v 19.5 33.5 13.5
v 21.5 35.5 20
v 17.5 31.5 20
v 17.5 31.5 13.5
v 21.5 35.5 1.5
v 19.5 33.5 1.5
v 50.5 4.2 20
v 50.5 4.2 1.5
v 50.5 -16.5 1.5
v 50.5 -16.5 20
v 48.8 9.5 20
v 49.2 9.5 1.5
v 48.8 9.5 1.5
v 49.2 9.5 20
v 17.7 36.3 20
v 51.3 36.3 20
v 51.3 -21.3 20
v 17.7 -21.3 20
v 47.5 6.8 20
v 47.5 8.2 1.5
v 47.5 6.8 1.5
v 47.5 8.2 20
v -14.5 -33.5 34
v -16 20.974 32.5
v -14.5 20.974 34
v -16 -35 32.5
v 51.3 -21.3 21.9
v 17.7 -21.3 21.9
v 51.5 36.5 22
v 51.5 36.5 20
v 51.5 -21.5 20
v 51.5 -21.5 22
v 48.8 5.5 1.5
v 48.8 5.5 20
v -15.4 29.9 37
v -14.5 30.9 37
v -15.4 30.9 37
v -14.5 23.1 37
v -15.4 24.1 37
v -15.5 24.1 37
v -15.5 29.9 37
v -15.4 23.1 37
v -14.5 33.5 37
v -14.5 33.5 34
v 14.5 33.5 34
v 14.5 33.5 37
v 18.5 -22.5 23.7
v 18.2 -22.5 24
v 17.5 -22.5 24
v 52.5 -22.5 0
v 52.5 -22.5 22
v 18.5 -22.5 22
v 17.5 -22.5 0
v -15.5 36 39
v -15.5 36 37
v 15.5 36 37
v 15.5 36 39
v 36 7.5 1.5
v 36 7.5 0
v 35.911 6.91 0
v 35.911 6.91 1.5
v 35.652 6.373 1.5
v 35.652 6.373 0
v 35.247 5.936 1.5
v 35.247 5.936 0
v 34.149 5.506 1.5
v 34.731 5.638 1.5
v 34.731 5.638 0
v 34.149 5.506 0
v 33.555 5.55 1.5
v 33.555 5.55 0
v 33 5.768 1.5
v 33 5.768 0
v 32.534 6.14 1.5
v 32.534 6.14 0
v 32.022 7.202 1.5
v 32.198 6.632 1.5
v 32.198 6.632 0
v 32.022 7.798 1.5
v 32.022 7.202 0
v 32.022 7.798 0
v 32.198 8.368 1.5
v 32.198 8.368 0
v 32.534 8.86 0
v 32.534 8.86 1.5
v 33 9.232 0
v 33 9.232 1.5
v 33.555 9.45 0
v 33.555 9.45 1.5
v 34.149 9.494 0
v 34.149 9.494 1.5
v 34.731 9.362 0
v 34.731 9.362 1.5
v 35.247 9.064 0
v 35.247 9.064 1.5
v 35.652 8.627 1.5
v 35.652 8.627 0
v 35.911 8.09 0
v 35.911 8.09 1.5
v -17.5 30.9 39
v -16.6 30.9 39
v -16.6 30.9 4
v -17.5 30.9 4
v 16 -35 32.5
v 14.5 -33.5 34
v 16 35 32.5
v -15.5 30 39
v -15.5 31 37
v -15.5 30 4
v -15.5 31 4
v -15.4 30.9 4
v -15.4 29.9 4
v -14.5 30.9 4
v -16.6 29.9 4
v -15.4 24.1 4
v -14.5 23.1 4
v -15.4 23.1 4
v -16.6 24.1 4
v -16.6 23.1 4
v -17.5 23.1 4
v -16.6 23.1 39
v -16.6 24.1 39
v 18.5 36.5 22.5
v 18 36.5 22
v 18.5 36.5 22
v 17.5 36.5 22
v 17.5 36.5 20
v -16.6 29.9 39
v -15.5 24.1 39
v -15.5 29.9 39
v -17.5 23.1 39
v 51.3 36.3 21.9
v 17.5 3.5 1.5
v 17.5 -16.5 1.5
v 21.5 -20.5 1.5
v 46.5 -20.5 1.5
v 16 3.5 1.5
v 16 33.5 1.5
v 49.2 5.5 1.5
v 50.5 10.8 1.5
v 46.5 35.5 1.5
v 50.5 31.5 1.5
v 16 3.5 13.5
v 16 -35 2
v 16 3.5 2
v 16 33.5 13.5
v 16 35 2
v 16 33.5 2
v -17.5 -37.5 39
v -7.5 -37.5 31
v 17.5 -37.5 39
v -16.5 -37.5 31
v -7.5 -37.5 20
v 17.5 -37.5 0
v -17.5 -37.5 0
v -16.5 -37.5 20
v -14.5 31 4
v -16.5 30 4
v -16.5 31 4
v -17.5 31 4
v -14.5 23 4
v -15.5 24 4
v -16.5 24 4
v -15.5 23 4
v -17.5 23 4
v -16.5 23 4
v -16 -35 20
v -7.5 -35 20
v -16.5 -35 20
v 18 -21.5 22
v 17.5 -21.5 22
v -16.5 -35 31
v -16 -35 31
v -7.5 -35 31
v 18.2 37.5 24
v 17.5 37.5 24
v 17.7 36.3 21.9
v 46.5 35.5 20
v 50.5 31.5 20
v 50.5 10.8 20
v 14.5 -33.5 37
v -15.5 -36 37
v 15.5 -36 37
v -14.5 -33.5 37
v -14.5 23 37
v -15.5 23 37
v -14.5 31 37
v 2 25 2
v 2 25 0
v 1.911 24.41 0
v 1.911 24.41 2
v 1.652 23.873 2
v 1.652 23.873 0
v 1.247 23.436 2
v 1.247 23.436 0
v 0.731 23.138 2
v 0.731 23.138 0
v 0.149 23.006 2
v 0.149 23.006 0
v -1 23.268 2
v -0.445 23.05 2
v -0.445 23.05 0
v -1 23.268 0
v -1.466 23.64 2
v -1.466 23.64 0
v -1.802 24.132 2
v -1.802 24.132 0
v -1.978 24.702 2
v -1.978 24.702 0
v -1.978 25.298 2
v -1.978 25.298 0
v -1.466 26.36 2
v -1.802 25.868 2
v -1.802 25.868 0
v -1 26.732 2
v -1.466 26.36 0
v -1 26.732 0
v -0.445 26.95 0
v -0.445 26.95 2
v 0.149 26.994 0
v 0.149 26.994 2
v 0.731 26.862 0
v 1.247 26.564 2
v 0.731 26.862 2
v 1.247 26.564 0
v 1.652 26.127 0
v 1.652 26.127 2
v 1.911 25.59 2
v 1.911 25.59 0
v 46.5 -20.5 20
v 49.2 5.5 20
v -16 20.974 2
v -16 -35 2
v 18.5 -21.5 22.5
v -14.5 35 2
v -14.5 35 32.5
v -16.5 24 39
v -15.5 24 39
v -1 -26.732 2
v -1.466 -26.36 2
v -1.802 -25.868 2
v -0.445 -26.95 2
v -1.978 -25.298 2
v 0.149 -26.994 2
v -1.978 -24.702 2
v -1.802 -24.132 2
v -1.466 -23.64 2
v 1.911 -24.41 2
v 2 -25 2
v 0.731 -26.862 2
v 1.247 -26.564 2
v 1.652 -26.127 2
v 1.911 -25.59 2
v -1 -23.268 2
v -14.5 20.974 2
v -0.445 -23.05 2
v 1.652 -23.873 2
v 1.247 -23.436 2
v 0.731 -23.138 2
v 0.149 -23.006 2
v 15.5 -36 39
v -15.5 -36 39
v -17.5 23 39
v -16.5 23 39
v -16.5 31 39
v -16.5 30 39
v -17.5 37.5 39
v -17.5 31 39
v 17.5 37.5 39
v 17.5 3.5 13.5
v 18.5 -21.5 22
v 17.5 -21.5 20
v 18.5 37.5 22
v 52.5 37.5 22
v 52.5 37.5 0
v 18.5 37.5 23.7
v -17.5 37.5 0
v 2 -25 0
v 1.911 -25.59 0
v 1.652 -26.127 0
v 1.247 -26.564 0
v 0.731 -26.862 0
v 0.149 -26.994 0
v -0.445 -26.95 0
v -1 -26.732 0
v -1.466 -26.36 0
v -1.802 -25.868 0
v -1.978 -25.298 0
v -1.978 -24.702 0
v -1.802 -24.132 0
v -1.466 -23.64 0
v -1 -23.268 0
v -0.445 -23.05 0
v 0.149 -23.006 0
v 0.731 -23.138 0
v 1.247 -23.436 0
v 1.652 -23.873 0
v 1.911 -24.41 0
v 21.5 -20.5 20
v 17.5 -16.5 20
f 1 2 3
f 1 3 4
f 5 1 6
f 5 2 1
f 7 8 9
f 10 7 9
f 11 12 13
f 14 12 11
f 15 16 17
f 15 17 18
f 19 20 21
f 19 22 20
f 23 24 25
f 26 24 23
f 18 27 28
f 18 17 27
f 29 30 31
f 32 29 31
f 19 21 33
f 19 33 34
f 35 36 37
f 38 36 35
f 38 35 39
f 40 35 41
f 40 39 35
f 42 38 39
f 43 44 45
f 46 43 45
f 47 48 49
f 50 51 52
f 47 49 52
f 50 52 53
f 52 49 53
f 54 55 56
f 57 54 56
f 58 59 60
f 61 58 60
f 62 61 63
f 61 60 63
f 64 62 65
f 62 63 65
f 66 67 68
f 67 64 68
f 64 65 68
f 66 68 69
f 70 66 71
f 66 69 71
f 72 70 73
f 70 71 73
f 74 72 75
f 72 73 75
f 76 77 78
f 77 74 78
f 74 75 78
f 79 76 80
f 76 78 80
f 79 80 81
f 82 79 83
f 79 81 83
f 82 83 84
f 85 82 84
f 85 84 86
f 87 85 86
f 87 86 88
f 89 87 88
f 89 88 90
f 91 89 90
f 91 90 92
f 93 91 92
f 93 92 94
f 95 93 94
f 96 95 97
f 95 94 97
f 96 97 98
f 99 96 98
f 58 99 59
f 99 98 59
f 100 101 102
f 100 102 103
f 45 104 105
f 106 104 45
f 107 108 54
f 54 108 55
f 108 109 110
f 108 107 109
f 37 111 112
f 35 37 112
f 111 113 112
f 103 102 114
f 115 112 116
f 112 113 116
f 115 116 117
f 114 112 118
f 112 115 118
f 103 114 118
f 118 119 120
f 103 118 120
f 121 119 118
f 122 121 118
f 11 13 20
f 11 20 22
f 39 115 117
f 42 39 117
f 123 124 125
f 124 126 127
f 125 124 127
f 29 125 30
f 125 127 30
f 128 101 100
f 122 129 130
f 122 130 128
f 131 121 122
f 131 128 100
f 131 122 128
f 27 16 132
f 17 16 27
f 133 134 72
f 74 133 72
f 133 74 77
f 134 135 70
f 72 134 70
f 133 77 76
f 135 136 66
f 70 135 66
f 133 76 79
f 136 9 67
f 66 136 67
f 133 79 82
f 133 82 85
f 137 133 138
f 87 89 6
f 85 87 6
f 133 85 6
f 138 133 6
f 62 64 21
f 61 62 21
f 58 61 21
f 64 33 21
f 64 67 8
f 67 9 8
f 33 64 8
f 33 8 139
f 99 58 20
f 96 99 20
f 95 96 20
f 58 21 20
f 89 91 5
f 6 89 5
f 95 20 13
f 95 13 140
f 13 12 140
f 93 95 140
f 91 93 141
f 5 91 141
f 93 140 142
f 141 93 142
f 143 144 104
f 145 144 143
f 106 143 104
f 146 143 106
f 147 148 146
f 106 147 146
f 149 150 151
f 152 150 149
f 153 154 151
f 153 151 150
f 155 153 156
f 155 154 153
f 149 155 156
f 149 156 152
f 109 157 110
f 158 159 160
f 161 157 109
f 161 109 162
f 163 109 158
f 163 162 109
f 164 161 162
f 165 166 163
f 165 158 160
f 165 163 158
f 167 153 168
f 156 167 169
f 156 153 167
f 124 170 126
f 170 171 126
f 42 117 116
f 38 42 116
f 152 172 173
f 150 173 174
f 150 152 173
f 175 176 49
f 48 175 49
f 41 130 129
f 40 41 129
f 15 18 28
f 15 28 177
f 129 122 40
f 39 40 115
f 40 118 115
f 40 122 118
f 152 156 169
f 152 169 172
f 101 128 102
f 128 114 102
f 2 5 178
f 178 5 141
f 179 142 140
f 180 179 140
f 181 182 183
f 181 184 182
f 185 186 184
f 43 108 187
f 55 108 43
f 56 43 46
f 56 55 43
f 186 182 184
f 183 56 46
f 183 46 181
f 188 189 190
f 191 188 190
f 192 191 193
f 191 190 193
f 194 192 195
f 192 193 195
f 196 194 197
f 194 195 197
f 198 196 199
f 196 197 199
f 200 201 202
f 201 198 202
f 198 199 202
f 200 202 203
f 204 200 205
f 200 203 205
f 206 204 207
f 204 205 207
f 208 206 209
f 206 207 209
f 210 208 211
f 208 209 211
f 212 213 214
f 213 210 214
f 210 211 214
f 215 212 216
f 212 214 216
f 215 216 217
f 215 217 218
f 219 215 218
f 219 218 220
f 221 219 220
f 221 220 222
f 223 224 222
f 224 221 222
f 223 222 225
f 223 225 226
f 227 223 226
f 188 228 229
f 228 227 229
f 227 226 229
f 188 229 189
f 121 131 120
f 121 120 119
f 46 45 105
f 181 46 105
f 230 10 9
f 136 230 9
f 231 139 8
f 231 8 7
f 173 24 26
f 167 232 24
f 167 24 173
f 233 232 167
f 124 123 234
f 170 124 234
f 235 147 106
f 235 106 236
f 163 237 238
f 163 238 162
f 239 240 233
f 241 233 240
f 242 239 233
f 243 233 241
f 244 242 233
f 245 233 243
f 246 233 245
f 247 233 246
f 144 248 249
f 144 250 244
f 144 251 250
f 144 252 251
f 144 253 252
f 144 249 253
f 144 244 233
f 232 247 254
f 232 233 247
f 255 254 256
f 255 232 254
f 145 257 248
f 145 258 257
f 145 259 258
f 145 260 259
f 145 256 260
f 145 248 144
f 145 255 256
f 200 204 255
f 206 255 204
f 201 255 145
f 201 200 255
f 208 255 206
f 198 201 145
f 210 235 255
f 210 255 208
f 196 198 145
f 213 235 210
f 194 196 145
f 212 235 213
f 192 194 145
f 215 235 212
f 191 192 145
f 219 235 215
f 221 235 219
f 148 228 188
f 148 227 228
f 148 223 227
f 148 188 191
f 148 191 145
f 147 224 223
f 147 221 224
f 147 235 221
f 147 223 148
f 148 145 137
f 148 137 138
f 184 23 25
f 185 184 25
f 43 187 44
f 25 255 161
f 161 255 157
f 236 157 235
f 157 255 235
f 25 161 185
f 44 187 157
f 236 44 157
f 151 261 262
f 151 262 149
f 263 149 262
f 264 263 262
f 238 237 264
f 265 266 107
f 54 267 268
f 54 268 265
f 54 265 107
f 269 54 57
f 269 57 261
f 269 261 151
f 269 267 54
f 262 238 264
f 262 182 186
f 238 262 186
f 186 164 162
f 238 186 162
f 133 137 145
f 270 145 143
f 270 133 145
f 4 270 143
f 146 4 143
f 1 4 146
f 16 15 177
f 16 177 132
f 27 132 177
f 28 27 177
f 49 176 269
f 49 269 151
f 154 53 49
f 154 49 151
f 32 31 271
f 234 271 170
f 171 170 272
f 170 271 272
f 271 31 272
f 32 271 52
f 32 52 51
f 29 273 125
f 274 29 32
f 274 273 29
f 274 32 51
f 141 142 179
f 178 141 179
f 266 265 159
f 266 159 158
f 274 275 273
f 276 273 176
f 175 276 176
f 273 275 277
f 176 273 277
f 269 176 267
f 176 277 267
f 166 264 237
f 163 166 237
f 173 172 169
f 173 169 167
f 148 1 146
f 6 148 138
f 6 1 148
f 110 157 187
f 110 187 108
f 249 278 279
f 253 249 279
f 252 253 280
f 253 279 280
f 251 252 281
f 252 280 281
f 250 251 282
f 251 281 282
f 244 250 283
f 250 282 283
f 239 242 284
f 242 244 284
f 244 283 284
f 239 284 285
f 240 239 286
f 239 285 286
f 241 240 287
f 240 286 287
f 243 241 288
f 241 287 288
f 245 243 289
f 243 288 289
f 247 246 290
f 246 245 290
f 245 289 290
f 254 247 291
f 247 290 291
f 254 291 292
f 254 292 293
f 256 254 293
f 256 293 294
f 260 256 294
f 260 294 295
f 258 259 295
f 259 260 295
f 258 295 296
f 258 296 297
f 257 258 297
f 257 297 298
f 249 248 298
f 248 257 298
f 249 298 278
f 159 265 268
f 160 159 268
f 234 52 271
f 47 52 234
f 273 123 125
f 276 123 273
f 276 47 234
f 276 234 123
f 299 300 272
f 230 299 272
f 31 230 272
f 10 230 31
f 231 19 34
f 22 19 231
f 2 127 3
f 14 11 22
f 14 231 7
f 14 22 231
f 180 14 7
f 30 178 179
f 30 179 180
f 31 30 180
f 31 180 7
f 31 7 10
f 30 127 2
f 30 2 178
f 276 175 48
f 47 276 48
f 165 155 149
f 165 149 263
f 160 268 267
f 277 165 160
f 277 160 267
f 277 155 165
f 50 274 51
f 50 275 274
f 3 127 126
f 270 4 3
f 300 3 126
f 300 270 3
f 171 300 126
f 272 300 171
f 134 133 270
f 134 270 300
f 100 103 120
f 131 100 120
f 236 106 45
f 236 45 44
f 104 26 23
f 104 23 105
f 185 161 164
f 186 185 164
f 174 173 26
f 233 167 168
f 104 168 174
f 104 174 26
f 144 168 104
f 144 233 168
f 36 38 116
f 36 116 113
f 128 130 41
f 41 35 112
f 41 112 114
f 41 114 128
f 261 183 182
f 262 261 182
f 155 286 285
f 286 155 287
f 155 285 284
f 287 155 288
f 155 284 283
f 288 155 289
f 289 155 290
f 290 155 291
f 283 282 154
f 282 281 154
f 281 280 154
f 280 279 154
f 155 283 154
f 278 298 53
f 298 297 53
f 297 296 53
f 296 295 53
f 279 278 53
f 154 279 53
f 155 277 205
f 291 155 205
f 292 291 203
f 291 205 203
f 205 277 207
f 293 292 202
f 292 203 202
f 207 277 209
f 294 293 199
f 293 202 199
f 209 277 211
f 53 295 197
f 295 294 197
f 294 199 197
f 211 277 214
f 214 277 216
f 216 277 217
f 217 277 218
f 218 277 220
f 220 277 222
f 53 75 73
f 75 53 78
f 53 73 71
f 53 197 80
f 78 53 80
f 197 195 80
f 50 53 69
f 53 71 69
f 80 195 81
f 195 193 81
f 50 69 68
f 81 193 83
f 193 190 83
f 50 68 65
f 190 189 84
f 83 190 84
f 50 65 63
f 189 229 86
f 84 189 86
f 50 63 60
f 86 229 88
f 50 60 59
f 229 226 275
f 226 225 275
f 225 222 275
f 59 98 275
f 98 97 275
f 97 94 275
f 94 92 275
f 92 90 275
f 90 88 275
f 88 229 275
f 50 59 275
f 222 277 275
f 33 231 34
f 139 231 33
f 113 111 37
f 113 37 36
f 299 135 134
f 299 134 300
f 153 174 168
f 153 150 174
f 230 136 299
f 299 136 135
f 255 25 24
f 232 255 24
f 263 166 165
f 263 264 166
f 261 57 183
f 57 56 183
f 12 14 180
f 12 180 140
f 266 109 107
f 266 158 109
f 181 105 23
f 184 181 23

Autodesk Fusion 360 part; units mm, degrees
sketch "Sketch1" plane through (0, 0, 0) normal (0, 0, 1) x (1, 0, 0)
  line L0 (-17.5, 37.5) -> (17.5, 37.5)
  line L1 (17.5, 37.5) -> (17.5, -37.5)
  line L2 (17.5, -37.5) -> (-17.5, -37.5)
  line L3 (-17.5, -37.5) -> (-17.5, 37.5)
  line L4 (-14.5, 33.5) -> (14.5, 33.5)
  line L5 (14.5, 33.5) -> (14.5, -33.5)
  line L6 (14.5, -33.5) -> (-14.5, -33.5)
  line L7 (-14.5, -33.5) -> (-14.5, 33.5)
  line L8 (-15.5, 36) -> (15.5, 36)
  line L9 (15.5, 36) -> (15.5, -36)
  line L10 (15.5, -36) -> (-15.5, -36)
  line L11 (-15.5, -36) -> (-15.5, 36)
  line L12 (-14.5, -33.5) -> (14.5, 33.5) construction
  line L13 (-15.5, -36) -> (15.5, 36) construction
  line L14 (-17.5, -37.5) -> (17.5, 37.5) construction
  circle A0 centre (0, 25) radius 2
  circle A1 centre (0, -25) radius 2
  line L15 (0, 25) -> (0, 0) construction
  line L16 (0, -25) -> (0, 0) construction
  dimension "d1" = 35
  dimension "d2" = 75
  dimension "d3" = 29
  dimension "d4" = 67
  dimension "d5" = 31
  dimension "d6" = 72
  dimension "d7" = 4
  dimension "d8" = 4
  dimension "d9" = 25
extrude "Extrude1" add sketch "Sketch1" along normal blind 2 contours L4 L5 L6 L7 makes body 1
extrude "Extrude2" add sketch "Sketch1" along normal blind 37 contours L8 L9 L10 L11 bodies 1
extrude "Extrude3" add sketch "Sketch1" along normal blind 39 contours L0 L1 L2 L3 bodies 1
sketch "Sketch2" plane through (-17.5, 0, 0) normal (-1, 0, 0) x (0, -1, 0)
  line L0 (-37.5, 0) -> (37.5, 0)
  line L1 (37.5, 0) -> (37.5, 39)
  line L2 (37.5, 39) -> (-37.5, 39)
  line L3 (-37.5, 39) -> (-37.5, 0)
  line L4 (-30, 39) -> (-24, 39)
  line L5 (-24, 39) -> (-24, 4)
  line L6 (-24, 4) -> (-30, 4)
  line L7 (-30, 4) -> (-30, 39)
  dimension "d16" = 6
  dimension "d17" = 35
extrude "Extrude4" cut sketch "Sketch2" against normal up to surface (3 mm away) contours L2 L4 L5 L6 L7 bodies 1
sketch "Sketch3" plane through (0, 0, 39) normal (0, 0, 1) x (-1, 0, 0)
  line L0 (17.5, -30) -> (15.5, -30)
  line L1 (15.5, -30) -> (15.5, -36)
  line L2 (15.5, -36) -> (-15.5, -36)
  line L3 (-15.5, -36) -> (-15.5, 36)
  line L4 (-15.5, 36) -> (15.5, 36)
  line L5 (15.5, 36) -> (15.5, -24)
  line L6 (15.5, -24) -> (17.5, -24)
  line L7 (17.5, -24) -> (17.5, 37.5)
  line L8 (17.5, 37.5) -> (-17.5, 37.5)
  line L9 (-17.5, 37.5) -> (-17.5, -37.5)
  line L10 (-17.5, -37.5) -> (17.5, -37.5)
  line L11 (17.5, -37.5) -> (17.5, -30)
  line L12 (15.5, -30) -> (14.5, -30)
  line L13 (14.5, -30) -> (14.5, -33.5)
  line L14 (14.5, -33.5) -> (-14.5, -33.5)
  line L15 (-14.5, -33.5) -> (-14.5, 33.5)
  line L16 (-14.5, 33.5) -> (14.5, 33.5)
  line L17 (14.5, 33.5) -> (14.5, -24)
  line L18 (14.5, -24) -> (15.5, -24)
  line L19 (15.5, -24) -> (15.5, 36)
  line L20 (15.5, 36) -> (-15.5, 36)
  line L21 (-15.5, 36) -> (-15.5, -36)
  line L22 (-15.5, -36) -> (15.5, -36)
  line L23 (15.5, -36) -> (15.5, -30)
  line L24 (17.5, -30) -> (14.5, -30)
  line L25 (14.5, -30) -> (14.5, -31)
  line L26 (14.5, -31) -> (17.5, -31)
  line L27 (17.5, -31) -> (17.5, -30)
  line L28 (17.5, -24) -> (14.5, -24)
  line L29 (14.5, -24) -> (14.5, -23)
  line L30 (14.5, -23) -> (17.5, -23)
  line L31 (17.5, -23) -> (17.5, -24)
  line L32 (16.5, -31) -> (16.5, -30)
  line L33 (16.5, -23) -> (16.5, -24)
  dimension "d20" = 3
  dimension "d21" = 1
  dimension "d22" = 3
  dimension "d23" = 1
extrude "Extrude5" cut sketch "Sketch3" against normal blind 35 contours L0 L11 L24 L26 L27 L32 | L1 L12 L13 L23 L24 L25 L26 | L6 L7 L28 L30 L31 L33 | L5 L17 L18 L19 L28 L29 L30 bodies 1
copy_body "Body->Comp1" bodies 1 removing the originals makes body 2 in component "base"
sketch "Sketch1 (2)" plane through (0, 0, 4) normal (0, 0, 1) x (-1, 0, 0) in component "protection"
  line L0 (14.5, -23) -> (14.5, -31)
  line L1 (14.5, -31) -> (15.5, -31)
  line L2 (15.5, -31) -> (15.5, -30)
  line L3 (15.5, -30) -> (16.5, -30)
  line L4 (16.5, -30) -> (16.5, -31)
  line L5 (16.5, -31) -> (17.5, -31)
  line L6 (17.5, -31) -> (17.5, -23)
  line L7 (17.5, -23) -> (16.5, -23)
  line L8 (16.5, -23) -> (16.5, -24)
  line L9 (16.5, -24) -> (15.5, -24)
  line L10 (15.5, -24) -> (15.5, -23)
  line L11 (15.5, -23) -> (14.5, -23)
  line L12 (16.6, -23.1) -> (16.6, -24.1)
  line L13 (16.6, -24.1) -> (15.4, -24.1)
  line L14 (15.4, -24.1) -> (15.4, -23.1)
  line L15 (15.4, -23.1) -> (14.6, -23.1)
  line L16 (14.6, -23.1) -> (14.6, -30.9)
  line L17 (14.6, -30.9) -> (15.4, -30.9)
  line L18 (15.4, -30.9) -> (15.4, -29.9)
  line L19 (15.4, -29.9) -> (16.6, -29.9)
  line L20 (16.6, -29.9) -> (16.6, -30.9)
  line L21 (16.6, -30.9) -> (17.4, -30.9)
  line L22 (17.4, -30.9) -> (17.4, -23.1)
  line L23 (17.4, -23.1) -> (16.6, -23.1)
  line L24 (14.6, -23.1) -> (14.5, -23.1)
  line L25 (17.4, -23.1) -> (17.5, -23.1)
  line L26 (14.6, -30.9) -> (14.5, -30.9)
  line L27 (17.4, -30.9) -> (17.5, -30.9)
  line L28 (16.5, -24.1) -> (16.5, -29.9)
  dimension "d26" = -0.1
extrude "Extrude1'" add sketch "Sketch1 (2)" along normal blind 35 separate body contours L0 L16 L24 L26 | L13 L14 L15 L16 L17 L18 L19 L28 | L12 L13 L19 L20 L21 L22 L23 L28 | L6 L22 L25 L27 makes body 3 in component "protection"
sketch "Sketch2 (2)" plane through (0, 0, 39) normal (0, 0, 1) x (-1, 0, 0) in component "protection"
  line L0 (14.5, -30.9) -> (15.4, -30.9)
  line L1 (15.4, -30.9) -> (15.4, -29.9)
  line L2 (15.4, -29.9) -> (16.6, -29.9)
  line L3 (16.6, -29.9) -> (16.6, -30.9)
  line L4 (16.6, -30.9) -> (17.4, -30.9)
  line L5 (17.4, -30.9) -> (17.5, -30.9)
  line L6 (17.5, -30.9) -> (17.5, -23.1)
  line L7 (17.5, -23.1) -> (17.4, -23.1)
  line L8 (17.4, -23.1) -> (16.6, -23.1)
  line L9 (16.6, -23.1) -> (16.6, -24.1)
  line L10 (16.6, -24.1) -> (15.4, -24.1)
  line L11 (15.4, -24.1) -> (15.4, -23.1)
  line L12 (15.4, -23.1) -> (14.5, -23.1)
  line L13 (14.5, -23.1) -> (14.5, -30.9)
  line L14 (15.5, -29.9) -> (15.5, -24.1)
extrude "Extrude4'" cut sketch "Sketch2 (2)" against normal blind 2 contours L0 L1 L2 L10 L11 L12 L13 L14 bodies 3 in component "protection"
sketch "Sketch4" plane through (0, 0, 2) normal (0, 0, 1) x (-1, 0, 0)
  circle A0 centre (0, -25) radius 2
  circle A1 centre (0, 25) radius 2
  line L0 (14.5, 33.5) -> (-14.5, 33.5)
  line L1 (-14.5, 33.5) -> (-14.5, -33.5)
  line L2 (-14.5, -33.5) -> (14.5, -33.5)
  line L3 (14.5, -33.5) -> (14.5, 33.5)
  line L4 (17.5, -37.5) -> (17.5, 37.5)
  line L5 (17.5, 37.5) -> (-17.5, 37.5)
  line L6 (-17.5, 37.5) -> (-17.5, -37.5)
  line L7 (-17.5, -37.5) -> (17.5, -37.5)
  line L8 (-14.5, -33.5) -> (-14.5, 33.5)
  line L9 (-14.5, 33.5) -> (14.5, 33.5)
  line L10 (14.5, 33.5) -> (14.5, -33.5)
  line L11 (14.5, -33.5) -> (-14.5, -33.5)
  circle A2 centre (0, 25) radius 2
  circle A3 centre (0, -25) radius 2
  line L12 (-16, -35) -> (16, -35)
  line L13 (16, -35) -> (16, 35)
  line L14 (16, 35) -> (-16, 35)
  line L15 (-16, 35) -> (-16, -35)
  line L16 (16, -35) -> (14.5, -35)
  line L17 (14.5, -35) -> (14.5, -20.9735)
  line L18 (14.5, -20.9735) -> (16, -20.9735)
  line L19 (16, -20.9735) -> (16, -35)
  dimension "d39" = 1.5
extrude "Extrude1''" cut sketch "Sketch4" along normal blind 32 contours L0 L1 L2 L3 L8 L9 L10 L11 L12 L13 L14 L15 L17 L18 bodies 2 in component "base"
chamfer "Chamfer1" distance 1.5 angle 45 4 edges at (-16, -7.0132, 34) (0, -35, 34) (0.75, 35, 34) (16, 0, 34) on bodies 2 in component "base"
sketch "Sketch5" plane through (0, 0, 0) normal (0, 0, 1) x (1, 0, 0)
  line L0 (-17.5, -37.5) -> (-17.5, 37.5)
  line L1 (-17.5, 37.5) -> (17.5, 37.5)
  line L2 (17.5, 37.5) -> (17.5, -37.5)
  line L3 (17.5, -37.5) -> (-17.5, -37.5)
  circle A0 centre (0, -25) radius 2
  circle A1 centre (0, 25) radius 2
  line L4 (17.5, 37.5) -> (52.5, 37.5)
  line L5 (52.5, 37.5) -> (52.5, -22.5)
  line L6 (52.5, -22.5) -> (17.5, -22.5)
  line L7 (17.5, -22.5) -> (17.5, 37.5)
  line L8 (17.5, 35.5) -> (50.5, 35.5)
  line L9 (50.5, 35.5) -> (50.5, -20.5)
  line L10 (50.5, -20.5) -> (17.5, -20.5)
  line L11 (17.5, -20.5) -> (17.5, 35.5)
  line L12 (51.5, -21.5) -> (16.5, -21.5)
  line L13 (16.5, -21.5) -> (16.5, 36.5)
  line L14 (16.5, 36.5) -> (51.5, 36.5)
  line L15 (51.5, 36.5) -> (51.5, -21.5)
  line L16 (17.5, 35.5) -> (50.5, -20.5) construction
  circle A2 centre (34, 7.5) radius 2
  point P0 (34, 7.5)
  dimension "d43" = 35
  dimension "d44" = 60
  dimension "d45" = 2
  dimension "d46" = 2
  dimension "d47" = 2
  dimension "d48" = -1
  dimension "d49" = 4
extrude "Extrude2'" add sketch "Sketch5" along normal blind 1.5 contours L2 L7 L8 L9 L10 L11 bodies 2 in component "base"
sketch "Sketch1 (3)" plane through (17.5, 0, 0) normal (1, 0, 0) x (0, 1, 0) in component "base"
  line L0 (-20.5, 0) -> (-20.5, 1.5)
  line L1 (-20.5, 1.5) -> (35.5, 1.5)
  line L2 (35.5, 1.5) -> (35.5, 0)
  line L3 (35.5, 0) -> (37.5, 0)
  line L4 (37.5, 0) -> (37.5, 39)
  line L5 (37.5, 39) -> (-37.5, 39)
  line L6 (-37.5, 39) -> (-37.5, 0)
  line L7 (-37.5, 0) -> (-20.5, 0)
  line L8 (33.5, 1.5) -> (3.5, 1.5)
  line L9 (3.5, 1.5) -> (3.5, 13.5)
  line L10 (3.5, 13.5) -> (33.5, 13.5)
  line L11 (33.5, 13.5) -> (33.5, 1.5)
  dimension "d52" = 30
  dimension "d53" = 12
  dimension "d54" = 2
extrude "Extrude3'" cut sketch "Sketch1 (3)" against normal up to surface (1.5 mm away) contours L1 L8 L9 L10 L11 bodies 2 in component "base"
extrude "Extrude4''" add sketch "Sketch5" along normal blind 20 contours L2 L7 L8 L9 L10 L12 L14 L15 bodies 2 in component "base"
extrude "Extrude5'" add sketch "Sketch5" along normal blind 22 contours L2 L4 L5 L6 L7 L12 L14 L15 bodies 2 in component "base"
chamfer "Chamfer2" distance 4 angle 45 4 edges at (17.5, -20.5, 10.75) (50.5, -20.5, 10.75) (50.5, 35.5, 10.75) (17.5, 35.5, 10.75) on bodies 2 in component "base"
sketch "Sketch2 (3)" plane through (17.5, 0, 0) normal (1, 0, 0) x (0, 1, 0) in component "base"
  line L0 (31.5, 13.5) -> (31.5, 20)
  line L1 (31.5, 20) -> (36.5, 20)
  line L2 (36.5, 20) -> (36.5, 22)
  line L3 (36.5, 22) -> (37.5, 22)
  line L4 (37.5, 22) -> (37.5, 39)
  line L5 (37.5, 39) -> (-37.5, 39)
  line L6 (-37.5, 39) -> (-37.5, 0)
  line L7 (-37.5, 0) -> (-22.5, 0)
  line L8 (-22.5, 0) -> (-22.5, 22)
  line L9 (-22.5, 22) -> (-21.5, 22)
  line L10 (-21.5, 22) -> (-21.5, 20)
  line L11 (-21.5, 20) -> (-16.5, 20)
  line L12 (-16.5, 20) -> (-16.5, 1.5)
  line L13 (-16.5, 1.5) -> (3.5, 1.5)
  line L14 (3.5, 1.5) -> (3.5, 13.5)
  line L15 (3.5, 13.5) -> (31.5, 13.5)
  line L16 (-22.5, 22) -> (37.5, 22)
  line L17 (37.5, 22) -> (37.5, 24)
  line L18 (37.5, 24) -> (-22.5, 24)
  line L19 (-22.5, 24) -> (-22.5, 22)
  dimension "d62" = 2
extrude "Extrude6" add sketch "Sketch2 (3)" along normal blind 1 contours L3 L4 L9 L16 L17 L18 L19 bodies 2 in component "base"
chamfer "Chamfer3" distance 0.5 angle 45 1 edges at (18.5, 7.5, 22) on bodies 2 in component "base"
chamfer "Chamfer4" distance 0.3 angle 45 1 edges at (18.5, 7.5, 24) on bodies 2 in component "base"
sketch "Sketch1 (4)" plane through (0, 0, 20) normal (0, 0, 1) x (-1, 0, 0) in component "lid"
  line L0 (-21.5, -35.5) -> (-46.5, -35.5)
  line L1 (-46.5, -35.5) -> (-50.5, -31.5)
  line L2 (-50.5, -31.5) -> (-50.5, 16.5)
  line L3 (-50.5, 16.5) -> (-46.5, 20.5)
  line L4 (-46.5, 20.5) -> (-21.5, 20.5)
  line L5 (-21.5, 20.5) -> (-17.5, 16.5)
  line L6 (-17.5, 16.5) -> (-17.5, 21.5)
  line L7 (-17.5, 21.5) -> (-51.5, 21.5)
  line L8 (-51.5, 21.5) -> (-51.5, -36.5)
  line L9 (-51.5, -36.5) -> (-17.5, -36.5)
  line L10 (-17.5, -36.5) -> (-17.5, -31.5)
  line L11 (-17.5, -31.5) -> (-21.5, -35.5)
  line L12 (-46.5, -35.5) -> (-50.5, -31.5)
  line L13 (-50.5, -31.5) -> (-50.5, 16.5)
  line L14 (-50.5, 16.5) -> (-46.5, 20.5)
  line L15 (-46.5, 20.5) -> (-21.5, 20.5)
  line L16 (-21.5, 20.5) -> (-17.5, 16.5)
  line L17 (-17.5, 21.5) -> (-17.5, 16.5)
  line L18 (-51.5, 21.5) -> (-17.5, 21.5)
  line L19 (-51.5, -36.5) -> (-51.5, 21.5)
  line L20 (-17.5, -36.5) -> (-51.5, -36.5)
  line L21 (-17.5, -31.5) -> (-17.5, -36.5)
  line L22 (-17.5, -31.5) -> (-21.5, -35.5)
  line L23 (-21.5, -35.5) -> (-46.5, -35.5)
  line L24 (-17.5, 16.5) -> (-17.5, -31.5)
  line L25 (14.5, -23) -> (15.5, -23)
  line L26 (15.5, -23) -> (15.5, -24)
  line L27 (15.5, -24) -> (16.5, -24)
  line L28 (16.5, -24) -> (16.5, -23)
  line L29 (16.5, -23) -> (17.5, -23)
  line L30 (17.5, -23) -> (17.5, 37.5)
  line L31 (17.5, 37.5) -> (-17.5, 37.5)
  line L32 (-17.5, 37.5) -> (-17.5, 22.5)
  line L33 (-17.5, 22.5) -> (-52.5, 22.5)
  line L34 (-52.5, 22.5) -> (-52.5, -37.5)
  line L35 (-52.5, -37.5) -> (17.5, -37.5)
  line L36 (17.5, -37.5) -> (17.5, -31)
  line L37 (17.5, -31) -> (16.5, -31)
  line L38 (16.5, -31) -> (16.5, -30)
  line L39 (16.5, -30) -> (15.5, -30)
  line L40 (15.5, -30) -> (15.5, -31)
  line L41 (15.5, -31) -> (14.5, -31)
  line L42 (14.5, -31) -> (14.5, -35)
  line L43 (14.5, -35) -> (-16, -35)
  line L44 (-16, -35) -> (-16, 35)
  line L45 (-16, 35) -> (16, 35)
  line L46 (16, 35) -> (16, -20.9735)
  line L47 (16, -20.9735) -> (14.5, -20.9735)
  line L48 (14.5, -20.9735) -> (14.5, -23)
  line L49 (-17.7, 16.5) -> (-17.7, -31.5)
  line L50 (-17.7, -31.5) -> (-17.7, -36.3)
  line L51 (-17.7, -36.3) -> (-51.3, -36.3)
  line L52 (-51.3, -36.3) -> (-51.3, 21.3)
  line L53 (-51.3, 21.3) -> (-17.7, 21.3)
  line L54 (-17.7, 21.3) -> (-17.7, 16.5)
  dimension "d67" = 0.2
extrude "Extrude1'''" add sketch "Sketch1 (4)" along normal blind 1.9 separate body contours L0 L1 L2 L3 L4 L5 L11 L12 L13 L14 L15 L16 L22 L23 L50 L51 L52 L53 L54 | L0 L1 L2 L3 L4 L5 L11 L12 L13 L14 L15 L16 L22 L23 L49 L50 L54 makes body 4 in component "lid"
sketch "Sketch3 (2)" plane through (50.5, 0, 0) normal (-1, 0, 0) x (0, -1, 0) in component "base"
  line L0 (-31.5, 20) -> (-31.5, 1.5)
  line L1 (-31.5, 1.5) -> (16.5, 1.5)
  line L2 (16.5, 1.5) -> (16.5, 20)
  line L3 (16.5, 20) -> (-31.5, 20)
  line L4 (-7.5, 20) -> (-7.5, 1.5) construction
  line L5 (-9.5, 20) -> (-5.5, 20)
  line L6 (-5.5, 20) -> (-5.5, 1.5)
  line L7 (-5.5, 1.5) -> (-9.5, 1.5)
  line L8 (-9.5, 1.5) -> (-9.5, 20)
  dimension "d70" = 4
extrude "Extrude7" add sketch "Sketch3 (2)" along normal blind 3 contours L1 L3 L5 L6 L7 L8 bodies 2 in component "base"
chamfer "Chamfer5" distance 1.3 angle 45 4 edges at (50.5, 5.5, 10.75) (50.5, 9.5, 10.75) (47.5, 9.5, 10.75) (47.5, 5.5, 10.75) on bodies 2 in component "base"
sketch "Sketch4 (2)" plane through (0, -37.5, 0) normal (0, -1, 0) x (1, 0, 0) in component "base"
  line L0 (-17.5, 0) -> (17.5, 0)
  line L1 (17.5, 0) -> (17.5, 39)
  line L2 (17.5, 39) -> (-17.5, 39)
  line L3 (-17.5, 39) -> (-17.5, 0)
  line L4 (15.5, 37) -> (-15.5, 37)
  line L5 (-15.5, 37) -> (-15.5, 39)
  line L6 (-15.5, 39) -> (15.5, 39)
  line L7 (15.5, 39) -> (15.5, 37)
  line L8 (-15.5, 37) -> (-15.5, 0) construction
  line L9 (-16.5, 31) -> (-7.5, 31)
  line L10 (-7.5, 31) -> (-7.5, 20)
  line L11 (-7.5, 20) -> (-16.5, 20)
  line L12 (-16.5, 20) -> (-16.5, 31)
  dimension "d74" = 1
  dimension "d75" = 9
  dimension "d76" = 11
  dimension "d77" = 6
extrude "Extrude8" cut sketch "Sketch4 (2)" against normal up to surface (2.5 mm away) contours L9 L10 L11 L12 bodies 2 in component "base"
component "base" placed x (1, 0, 0) y (0, 1, 0) z (0, 0, 1) at (0, 0, 0)
component "protection" placed x (1, 0, 0) y (0, 1, 0) z (0, 0, 1) at (0, 0, 0)
component "lid" placed x (1, 0, 0) y (0, 1, 0) z (0, 0, 1) at (0, 0, 0)
